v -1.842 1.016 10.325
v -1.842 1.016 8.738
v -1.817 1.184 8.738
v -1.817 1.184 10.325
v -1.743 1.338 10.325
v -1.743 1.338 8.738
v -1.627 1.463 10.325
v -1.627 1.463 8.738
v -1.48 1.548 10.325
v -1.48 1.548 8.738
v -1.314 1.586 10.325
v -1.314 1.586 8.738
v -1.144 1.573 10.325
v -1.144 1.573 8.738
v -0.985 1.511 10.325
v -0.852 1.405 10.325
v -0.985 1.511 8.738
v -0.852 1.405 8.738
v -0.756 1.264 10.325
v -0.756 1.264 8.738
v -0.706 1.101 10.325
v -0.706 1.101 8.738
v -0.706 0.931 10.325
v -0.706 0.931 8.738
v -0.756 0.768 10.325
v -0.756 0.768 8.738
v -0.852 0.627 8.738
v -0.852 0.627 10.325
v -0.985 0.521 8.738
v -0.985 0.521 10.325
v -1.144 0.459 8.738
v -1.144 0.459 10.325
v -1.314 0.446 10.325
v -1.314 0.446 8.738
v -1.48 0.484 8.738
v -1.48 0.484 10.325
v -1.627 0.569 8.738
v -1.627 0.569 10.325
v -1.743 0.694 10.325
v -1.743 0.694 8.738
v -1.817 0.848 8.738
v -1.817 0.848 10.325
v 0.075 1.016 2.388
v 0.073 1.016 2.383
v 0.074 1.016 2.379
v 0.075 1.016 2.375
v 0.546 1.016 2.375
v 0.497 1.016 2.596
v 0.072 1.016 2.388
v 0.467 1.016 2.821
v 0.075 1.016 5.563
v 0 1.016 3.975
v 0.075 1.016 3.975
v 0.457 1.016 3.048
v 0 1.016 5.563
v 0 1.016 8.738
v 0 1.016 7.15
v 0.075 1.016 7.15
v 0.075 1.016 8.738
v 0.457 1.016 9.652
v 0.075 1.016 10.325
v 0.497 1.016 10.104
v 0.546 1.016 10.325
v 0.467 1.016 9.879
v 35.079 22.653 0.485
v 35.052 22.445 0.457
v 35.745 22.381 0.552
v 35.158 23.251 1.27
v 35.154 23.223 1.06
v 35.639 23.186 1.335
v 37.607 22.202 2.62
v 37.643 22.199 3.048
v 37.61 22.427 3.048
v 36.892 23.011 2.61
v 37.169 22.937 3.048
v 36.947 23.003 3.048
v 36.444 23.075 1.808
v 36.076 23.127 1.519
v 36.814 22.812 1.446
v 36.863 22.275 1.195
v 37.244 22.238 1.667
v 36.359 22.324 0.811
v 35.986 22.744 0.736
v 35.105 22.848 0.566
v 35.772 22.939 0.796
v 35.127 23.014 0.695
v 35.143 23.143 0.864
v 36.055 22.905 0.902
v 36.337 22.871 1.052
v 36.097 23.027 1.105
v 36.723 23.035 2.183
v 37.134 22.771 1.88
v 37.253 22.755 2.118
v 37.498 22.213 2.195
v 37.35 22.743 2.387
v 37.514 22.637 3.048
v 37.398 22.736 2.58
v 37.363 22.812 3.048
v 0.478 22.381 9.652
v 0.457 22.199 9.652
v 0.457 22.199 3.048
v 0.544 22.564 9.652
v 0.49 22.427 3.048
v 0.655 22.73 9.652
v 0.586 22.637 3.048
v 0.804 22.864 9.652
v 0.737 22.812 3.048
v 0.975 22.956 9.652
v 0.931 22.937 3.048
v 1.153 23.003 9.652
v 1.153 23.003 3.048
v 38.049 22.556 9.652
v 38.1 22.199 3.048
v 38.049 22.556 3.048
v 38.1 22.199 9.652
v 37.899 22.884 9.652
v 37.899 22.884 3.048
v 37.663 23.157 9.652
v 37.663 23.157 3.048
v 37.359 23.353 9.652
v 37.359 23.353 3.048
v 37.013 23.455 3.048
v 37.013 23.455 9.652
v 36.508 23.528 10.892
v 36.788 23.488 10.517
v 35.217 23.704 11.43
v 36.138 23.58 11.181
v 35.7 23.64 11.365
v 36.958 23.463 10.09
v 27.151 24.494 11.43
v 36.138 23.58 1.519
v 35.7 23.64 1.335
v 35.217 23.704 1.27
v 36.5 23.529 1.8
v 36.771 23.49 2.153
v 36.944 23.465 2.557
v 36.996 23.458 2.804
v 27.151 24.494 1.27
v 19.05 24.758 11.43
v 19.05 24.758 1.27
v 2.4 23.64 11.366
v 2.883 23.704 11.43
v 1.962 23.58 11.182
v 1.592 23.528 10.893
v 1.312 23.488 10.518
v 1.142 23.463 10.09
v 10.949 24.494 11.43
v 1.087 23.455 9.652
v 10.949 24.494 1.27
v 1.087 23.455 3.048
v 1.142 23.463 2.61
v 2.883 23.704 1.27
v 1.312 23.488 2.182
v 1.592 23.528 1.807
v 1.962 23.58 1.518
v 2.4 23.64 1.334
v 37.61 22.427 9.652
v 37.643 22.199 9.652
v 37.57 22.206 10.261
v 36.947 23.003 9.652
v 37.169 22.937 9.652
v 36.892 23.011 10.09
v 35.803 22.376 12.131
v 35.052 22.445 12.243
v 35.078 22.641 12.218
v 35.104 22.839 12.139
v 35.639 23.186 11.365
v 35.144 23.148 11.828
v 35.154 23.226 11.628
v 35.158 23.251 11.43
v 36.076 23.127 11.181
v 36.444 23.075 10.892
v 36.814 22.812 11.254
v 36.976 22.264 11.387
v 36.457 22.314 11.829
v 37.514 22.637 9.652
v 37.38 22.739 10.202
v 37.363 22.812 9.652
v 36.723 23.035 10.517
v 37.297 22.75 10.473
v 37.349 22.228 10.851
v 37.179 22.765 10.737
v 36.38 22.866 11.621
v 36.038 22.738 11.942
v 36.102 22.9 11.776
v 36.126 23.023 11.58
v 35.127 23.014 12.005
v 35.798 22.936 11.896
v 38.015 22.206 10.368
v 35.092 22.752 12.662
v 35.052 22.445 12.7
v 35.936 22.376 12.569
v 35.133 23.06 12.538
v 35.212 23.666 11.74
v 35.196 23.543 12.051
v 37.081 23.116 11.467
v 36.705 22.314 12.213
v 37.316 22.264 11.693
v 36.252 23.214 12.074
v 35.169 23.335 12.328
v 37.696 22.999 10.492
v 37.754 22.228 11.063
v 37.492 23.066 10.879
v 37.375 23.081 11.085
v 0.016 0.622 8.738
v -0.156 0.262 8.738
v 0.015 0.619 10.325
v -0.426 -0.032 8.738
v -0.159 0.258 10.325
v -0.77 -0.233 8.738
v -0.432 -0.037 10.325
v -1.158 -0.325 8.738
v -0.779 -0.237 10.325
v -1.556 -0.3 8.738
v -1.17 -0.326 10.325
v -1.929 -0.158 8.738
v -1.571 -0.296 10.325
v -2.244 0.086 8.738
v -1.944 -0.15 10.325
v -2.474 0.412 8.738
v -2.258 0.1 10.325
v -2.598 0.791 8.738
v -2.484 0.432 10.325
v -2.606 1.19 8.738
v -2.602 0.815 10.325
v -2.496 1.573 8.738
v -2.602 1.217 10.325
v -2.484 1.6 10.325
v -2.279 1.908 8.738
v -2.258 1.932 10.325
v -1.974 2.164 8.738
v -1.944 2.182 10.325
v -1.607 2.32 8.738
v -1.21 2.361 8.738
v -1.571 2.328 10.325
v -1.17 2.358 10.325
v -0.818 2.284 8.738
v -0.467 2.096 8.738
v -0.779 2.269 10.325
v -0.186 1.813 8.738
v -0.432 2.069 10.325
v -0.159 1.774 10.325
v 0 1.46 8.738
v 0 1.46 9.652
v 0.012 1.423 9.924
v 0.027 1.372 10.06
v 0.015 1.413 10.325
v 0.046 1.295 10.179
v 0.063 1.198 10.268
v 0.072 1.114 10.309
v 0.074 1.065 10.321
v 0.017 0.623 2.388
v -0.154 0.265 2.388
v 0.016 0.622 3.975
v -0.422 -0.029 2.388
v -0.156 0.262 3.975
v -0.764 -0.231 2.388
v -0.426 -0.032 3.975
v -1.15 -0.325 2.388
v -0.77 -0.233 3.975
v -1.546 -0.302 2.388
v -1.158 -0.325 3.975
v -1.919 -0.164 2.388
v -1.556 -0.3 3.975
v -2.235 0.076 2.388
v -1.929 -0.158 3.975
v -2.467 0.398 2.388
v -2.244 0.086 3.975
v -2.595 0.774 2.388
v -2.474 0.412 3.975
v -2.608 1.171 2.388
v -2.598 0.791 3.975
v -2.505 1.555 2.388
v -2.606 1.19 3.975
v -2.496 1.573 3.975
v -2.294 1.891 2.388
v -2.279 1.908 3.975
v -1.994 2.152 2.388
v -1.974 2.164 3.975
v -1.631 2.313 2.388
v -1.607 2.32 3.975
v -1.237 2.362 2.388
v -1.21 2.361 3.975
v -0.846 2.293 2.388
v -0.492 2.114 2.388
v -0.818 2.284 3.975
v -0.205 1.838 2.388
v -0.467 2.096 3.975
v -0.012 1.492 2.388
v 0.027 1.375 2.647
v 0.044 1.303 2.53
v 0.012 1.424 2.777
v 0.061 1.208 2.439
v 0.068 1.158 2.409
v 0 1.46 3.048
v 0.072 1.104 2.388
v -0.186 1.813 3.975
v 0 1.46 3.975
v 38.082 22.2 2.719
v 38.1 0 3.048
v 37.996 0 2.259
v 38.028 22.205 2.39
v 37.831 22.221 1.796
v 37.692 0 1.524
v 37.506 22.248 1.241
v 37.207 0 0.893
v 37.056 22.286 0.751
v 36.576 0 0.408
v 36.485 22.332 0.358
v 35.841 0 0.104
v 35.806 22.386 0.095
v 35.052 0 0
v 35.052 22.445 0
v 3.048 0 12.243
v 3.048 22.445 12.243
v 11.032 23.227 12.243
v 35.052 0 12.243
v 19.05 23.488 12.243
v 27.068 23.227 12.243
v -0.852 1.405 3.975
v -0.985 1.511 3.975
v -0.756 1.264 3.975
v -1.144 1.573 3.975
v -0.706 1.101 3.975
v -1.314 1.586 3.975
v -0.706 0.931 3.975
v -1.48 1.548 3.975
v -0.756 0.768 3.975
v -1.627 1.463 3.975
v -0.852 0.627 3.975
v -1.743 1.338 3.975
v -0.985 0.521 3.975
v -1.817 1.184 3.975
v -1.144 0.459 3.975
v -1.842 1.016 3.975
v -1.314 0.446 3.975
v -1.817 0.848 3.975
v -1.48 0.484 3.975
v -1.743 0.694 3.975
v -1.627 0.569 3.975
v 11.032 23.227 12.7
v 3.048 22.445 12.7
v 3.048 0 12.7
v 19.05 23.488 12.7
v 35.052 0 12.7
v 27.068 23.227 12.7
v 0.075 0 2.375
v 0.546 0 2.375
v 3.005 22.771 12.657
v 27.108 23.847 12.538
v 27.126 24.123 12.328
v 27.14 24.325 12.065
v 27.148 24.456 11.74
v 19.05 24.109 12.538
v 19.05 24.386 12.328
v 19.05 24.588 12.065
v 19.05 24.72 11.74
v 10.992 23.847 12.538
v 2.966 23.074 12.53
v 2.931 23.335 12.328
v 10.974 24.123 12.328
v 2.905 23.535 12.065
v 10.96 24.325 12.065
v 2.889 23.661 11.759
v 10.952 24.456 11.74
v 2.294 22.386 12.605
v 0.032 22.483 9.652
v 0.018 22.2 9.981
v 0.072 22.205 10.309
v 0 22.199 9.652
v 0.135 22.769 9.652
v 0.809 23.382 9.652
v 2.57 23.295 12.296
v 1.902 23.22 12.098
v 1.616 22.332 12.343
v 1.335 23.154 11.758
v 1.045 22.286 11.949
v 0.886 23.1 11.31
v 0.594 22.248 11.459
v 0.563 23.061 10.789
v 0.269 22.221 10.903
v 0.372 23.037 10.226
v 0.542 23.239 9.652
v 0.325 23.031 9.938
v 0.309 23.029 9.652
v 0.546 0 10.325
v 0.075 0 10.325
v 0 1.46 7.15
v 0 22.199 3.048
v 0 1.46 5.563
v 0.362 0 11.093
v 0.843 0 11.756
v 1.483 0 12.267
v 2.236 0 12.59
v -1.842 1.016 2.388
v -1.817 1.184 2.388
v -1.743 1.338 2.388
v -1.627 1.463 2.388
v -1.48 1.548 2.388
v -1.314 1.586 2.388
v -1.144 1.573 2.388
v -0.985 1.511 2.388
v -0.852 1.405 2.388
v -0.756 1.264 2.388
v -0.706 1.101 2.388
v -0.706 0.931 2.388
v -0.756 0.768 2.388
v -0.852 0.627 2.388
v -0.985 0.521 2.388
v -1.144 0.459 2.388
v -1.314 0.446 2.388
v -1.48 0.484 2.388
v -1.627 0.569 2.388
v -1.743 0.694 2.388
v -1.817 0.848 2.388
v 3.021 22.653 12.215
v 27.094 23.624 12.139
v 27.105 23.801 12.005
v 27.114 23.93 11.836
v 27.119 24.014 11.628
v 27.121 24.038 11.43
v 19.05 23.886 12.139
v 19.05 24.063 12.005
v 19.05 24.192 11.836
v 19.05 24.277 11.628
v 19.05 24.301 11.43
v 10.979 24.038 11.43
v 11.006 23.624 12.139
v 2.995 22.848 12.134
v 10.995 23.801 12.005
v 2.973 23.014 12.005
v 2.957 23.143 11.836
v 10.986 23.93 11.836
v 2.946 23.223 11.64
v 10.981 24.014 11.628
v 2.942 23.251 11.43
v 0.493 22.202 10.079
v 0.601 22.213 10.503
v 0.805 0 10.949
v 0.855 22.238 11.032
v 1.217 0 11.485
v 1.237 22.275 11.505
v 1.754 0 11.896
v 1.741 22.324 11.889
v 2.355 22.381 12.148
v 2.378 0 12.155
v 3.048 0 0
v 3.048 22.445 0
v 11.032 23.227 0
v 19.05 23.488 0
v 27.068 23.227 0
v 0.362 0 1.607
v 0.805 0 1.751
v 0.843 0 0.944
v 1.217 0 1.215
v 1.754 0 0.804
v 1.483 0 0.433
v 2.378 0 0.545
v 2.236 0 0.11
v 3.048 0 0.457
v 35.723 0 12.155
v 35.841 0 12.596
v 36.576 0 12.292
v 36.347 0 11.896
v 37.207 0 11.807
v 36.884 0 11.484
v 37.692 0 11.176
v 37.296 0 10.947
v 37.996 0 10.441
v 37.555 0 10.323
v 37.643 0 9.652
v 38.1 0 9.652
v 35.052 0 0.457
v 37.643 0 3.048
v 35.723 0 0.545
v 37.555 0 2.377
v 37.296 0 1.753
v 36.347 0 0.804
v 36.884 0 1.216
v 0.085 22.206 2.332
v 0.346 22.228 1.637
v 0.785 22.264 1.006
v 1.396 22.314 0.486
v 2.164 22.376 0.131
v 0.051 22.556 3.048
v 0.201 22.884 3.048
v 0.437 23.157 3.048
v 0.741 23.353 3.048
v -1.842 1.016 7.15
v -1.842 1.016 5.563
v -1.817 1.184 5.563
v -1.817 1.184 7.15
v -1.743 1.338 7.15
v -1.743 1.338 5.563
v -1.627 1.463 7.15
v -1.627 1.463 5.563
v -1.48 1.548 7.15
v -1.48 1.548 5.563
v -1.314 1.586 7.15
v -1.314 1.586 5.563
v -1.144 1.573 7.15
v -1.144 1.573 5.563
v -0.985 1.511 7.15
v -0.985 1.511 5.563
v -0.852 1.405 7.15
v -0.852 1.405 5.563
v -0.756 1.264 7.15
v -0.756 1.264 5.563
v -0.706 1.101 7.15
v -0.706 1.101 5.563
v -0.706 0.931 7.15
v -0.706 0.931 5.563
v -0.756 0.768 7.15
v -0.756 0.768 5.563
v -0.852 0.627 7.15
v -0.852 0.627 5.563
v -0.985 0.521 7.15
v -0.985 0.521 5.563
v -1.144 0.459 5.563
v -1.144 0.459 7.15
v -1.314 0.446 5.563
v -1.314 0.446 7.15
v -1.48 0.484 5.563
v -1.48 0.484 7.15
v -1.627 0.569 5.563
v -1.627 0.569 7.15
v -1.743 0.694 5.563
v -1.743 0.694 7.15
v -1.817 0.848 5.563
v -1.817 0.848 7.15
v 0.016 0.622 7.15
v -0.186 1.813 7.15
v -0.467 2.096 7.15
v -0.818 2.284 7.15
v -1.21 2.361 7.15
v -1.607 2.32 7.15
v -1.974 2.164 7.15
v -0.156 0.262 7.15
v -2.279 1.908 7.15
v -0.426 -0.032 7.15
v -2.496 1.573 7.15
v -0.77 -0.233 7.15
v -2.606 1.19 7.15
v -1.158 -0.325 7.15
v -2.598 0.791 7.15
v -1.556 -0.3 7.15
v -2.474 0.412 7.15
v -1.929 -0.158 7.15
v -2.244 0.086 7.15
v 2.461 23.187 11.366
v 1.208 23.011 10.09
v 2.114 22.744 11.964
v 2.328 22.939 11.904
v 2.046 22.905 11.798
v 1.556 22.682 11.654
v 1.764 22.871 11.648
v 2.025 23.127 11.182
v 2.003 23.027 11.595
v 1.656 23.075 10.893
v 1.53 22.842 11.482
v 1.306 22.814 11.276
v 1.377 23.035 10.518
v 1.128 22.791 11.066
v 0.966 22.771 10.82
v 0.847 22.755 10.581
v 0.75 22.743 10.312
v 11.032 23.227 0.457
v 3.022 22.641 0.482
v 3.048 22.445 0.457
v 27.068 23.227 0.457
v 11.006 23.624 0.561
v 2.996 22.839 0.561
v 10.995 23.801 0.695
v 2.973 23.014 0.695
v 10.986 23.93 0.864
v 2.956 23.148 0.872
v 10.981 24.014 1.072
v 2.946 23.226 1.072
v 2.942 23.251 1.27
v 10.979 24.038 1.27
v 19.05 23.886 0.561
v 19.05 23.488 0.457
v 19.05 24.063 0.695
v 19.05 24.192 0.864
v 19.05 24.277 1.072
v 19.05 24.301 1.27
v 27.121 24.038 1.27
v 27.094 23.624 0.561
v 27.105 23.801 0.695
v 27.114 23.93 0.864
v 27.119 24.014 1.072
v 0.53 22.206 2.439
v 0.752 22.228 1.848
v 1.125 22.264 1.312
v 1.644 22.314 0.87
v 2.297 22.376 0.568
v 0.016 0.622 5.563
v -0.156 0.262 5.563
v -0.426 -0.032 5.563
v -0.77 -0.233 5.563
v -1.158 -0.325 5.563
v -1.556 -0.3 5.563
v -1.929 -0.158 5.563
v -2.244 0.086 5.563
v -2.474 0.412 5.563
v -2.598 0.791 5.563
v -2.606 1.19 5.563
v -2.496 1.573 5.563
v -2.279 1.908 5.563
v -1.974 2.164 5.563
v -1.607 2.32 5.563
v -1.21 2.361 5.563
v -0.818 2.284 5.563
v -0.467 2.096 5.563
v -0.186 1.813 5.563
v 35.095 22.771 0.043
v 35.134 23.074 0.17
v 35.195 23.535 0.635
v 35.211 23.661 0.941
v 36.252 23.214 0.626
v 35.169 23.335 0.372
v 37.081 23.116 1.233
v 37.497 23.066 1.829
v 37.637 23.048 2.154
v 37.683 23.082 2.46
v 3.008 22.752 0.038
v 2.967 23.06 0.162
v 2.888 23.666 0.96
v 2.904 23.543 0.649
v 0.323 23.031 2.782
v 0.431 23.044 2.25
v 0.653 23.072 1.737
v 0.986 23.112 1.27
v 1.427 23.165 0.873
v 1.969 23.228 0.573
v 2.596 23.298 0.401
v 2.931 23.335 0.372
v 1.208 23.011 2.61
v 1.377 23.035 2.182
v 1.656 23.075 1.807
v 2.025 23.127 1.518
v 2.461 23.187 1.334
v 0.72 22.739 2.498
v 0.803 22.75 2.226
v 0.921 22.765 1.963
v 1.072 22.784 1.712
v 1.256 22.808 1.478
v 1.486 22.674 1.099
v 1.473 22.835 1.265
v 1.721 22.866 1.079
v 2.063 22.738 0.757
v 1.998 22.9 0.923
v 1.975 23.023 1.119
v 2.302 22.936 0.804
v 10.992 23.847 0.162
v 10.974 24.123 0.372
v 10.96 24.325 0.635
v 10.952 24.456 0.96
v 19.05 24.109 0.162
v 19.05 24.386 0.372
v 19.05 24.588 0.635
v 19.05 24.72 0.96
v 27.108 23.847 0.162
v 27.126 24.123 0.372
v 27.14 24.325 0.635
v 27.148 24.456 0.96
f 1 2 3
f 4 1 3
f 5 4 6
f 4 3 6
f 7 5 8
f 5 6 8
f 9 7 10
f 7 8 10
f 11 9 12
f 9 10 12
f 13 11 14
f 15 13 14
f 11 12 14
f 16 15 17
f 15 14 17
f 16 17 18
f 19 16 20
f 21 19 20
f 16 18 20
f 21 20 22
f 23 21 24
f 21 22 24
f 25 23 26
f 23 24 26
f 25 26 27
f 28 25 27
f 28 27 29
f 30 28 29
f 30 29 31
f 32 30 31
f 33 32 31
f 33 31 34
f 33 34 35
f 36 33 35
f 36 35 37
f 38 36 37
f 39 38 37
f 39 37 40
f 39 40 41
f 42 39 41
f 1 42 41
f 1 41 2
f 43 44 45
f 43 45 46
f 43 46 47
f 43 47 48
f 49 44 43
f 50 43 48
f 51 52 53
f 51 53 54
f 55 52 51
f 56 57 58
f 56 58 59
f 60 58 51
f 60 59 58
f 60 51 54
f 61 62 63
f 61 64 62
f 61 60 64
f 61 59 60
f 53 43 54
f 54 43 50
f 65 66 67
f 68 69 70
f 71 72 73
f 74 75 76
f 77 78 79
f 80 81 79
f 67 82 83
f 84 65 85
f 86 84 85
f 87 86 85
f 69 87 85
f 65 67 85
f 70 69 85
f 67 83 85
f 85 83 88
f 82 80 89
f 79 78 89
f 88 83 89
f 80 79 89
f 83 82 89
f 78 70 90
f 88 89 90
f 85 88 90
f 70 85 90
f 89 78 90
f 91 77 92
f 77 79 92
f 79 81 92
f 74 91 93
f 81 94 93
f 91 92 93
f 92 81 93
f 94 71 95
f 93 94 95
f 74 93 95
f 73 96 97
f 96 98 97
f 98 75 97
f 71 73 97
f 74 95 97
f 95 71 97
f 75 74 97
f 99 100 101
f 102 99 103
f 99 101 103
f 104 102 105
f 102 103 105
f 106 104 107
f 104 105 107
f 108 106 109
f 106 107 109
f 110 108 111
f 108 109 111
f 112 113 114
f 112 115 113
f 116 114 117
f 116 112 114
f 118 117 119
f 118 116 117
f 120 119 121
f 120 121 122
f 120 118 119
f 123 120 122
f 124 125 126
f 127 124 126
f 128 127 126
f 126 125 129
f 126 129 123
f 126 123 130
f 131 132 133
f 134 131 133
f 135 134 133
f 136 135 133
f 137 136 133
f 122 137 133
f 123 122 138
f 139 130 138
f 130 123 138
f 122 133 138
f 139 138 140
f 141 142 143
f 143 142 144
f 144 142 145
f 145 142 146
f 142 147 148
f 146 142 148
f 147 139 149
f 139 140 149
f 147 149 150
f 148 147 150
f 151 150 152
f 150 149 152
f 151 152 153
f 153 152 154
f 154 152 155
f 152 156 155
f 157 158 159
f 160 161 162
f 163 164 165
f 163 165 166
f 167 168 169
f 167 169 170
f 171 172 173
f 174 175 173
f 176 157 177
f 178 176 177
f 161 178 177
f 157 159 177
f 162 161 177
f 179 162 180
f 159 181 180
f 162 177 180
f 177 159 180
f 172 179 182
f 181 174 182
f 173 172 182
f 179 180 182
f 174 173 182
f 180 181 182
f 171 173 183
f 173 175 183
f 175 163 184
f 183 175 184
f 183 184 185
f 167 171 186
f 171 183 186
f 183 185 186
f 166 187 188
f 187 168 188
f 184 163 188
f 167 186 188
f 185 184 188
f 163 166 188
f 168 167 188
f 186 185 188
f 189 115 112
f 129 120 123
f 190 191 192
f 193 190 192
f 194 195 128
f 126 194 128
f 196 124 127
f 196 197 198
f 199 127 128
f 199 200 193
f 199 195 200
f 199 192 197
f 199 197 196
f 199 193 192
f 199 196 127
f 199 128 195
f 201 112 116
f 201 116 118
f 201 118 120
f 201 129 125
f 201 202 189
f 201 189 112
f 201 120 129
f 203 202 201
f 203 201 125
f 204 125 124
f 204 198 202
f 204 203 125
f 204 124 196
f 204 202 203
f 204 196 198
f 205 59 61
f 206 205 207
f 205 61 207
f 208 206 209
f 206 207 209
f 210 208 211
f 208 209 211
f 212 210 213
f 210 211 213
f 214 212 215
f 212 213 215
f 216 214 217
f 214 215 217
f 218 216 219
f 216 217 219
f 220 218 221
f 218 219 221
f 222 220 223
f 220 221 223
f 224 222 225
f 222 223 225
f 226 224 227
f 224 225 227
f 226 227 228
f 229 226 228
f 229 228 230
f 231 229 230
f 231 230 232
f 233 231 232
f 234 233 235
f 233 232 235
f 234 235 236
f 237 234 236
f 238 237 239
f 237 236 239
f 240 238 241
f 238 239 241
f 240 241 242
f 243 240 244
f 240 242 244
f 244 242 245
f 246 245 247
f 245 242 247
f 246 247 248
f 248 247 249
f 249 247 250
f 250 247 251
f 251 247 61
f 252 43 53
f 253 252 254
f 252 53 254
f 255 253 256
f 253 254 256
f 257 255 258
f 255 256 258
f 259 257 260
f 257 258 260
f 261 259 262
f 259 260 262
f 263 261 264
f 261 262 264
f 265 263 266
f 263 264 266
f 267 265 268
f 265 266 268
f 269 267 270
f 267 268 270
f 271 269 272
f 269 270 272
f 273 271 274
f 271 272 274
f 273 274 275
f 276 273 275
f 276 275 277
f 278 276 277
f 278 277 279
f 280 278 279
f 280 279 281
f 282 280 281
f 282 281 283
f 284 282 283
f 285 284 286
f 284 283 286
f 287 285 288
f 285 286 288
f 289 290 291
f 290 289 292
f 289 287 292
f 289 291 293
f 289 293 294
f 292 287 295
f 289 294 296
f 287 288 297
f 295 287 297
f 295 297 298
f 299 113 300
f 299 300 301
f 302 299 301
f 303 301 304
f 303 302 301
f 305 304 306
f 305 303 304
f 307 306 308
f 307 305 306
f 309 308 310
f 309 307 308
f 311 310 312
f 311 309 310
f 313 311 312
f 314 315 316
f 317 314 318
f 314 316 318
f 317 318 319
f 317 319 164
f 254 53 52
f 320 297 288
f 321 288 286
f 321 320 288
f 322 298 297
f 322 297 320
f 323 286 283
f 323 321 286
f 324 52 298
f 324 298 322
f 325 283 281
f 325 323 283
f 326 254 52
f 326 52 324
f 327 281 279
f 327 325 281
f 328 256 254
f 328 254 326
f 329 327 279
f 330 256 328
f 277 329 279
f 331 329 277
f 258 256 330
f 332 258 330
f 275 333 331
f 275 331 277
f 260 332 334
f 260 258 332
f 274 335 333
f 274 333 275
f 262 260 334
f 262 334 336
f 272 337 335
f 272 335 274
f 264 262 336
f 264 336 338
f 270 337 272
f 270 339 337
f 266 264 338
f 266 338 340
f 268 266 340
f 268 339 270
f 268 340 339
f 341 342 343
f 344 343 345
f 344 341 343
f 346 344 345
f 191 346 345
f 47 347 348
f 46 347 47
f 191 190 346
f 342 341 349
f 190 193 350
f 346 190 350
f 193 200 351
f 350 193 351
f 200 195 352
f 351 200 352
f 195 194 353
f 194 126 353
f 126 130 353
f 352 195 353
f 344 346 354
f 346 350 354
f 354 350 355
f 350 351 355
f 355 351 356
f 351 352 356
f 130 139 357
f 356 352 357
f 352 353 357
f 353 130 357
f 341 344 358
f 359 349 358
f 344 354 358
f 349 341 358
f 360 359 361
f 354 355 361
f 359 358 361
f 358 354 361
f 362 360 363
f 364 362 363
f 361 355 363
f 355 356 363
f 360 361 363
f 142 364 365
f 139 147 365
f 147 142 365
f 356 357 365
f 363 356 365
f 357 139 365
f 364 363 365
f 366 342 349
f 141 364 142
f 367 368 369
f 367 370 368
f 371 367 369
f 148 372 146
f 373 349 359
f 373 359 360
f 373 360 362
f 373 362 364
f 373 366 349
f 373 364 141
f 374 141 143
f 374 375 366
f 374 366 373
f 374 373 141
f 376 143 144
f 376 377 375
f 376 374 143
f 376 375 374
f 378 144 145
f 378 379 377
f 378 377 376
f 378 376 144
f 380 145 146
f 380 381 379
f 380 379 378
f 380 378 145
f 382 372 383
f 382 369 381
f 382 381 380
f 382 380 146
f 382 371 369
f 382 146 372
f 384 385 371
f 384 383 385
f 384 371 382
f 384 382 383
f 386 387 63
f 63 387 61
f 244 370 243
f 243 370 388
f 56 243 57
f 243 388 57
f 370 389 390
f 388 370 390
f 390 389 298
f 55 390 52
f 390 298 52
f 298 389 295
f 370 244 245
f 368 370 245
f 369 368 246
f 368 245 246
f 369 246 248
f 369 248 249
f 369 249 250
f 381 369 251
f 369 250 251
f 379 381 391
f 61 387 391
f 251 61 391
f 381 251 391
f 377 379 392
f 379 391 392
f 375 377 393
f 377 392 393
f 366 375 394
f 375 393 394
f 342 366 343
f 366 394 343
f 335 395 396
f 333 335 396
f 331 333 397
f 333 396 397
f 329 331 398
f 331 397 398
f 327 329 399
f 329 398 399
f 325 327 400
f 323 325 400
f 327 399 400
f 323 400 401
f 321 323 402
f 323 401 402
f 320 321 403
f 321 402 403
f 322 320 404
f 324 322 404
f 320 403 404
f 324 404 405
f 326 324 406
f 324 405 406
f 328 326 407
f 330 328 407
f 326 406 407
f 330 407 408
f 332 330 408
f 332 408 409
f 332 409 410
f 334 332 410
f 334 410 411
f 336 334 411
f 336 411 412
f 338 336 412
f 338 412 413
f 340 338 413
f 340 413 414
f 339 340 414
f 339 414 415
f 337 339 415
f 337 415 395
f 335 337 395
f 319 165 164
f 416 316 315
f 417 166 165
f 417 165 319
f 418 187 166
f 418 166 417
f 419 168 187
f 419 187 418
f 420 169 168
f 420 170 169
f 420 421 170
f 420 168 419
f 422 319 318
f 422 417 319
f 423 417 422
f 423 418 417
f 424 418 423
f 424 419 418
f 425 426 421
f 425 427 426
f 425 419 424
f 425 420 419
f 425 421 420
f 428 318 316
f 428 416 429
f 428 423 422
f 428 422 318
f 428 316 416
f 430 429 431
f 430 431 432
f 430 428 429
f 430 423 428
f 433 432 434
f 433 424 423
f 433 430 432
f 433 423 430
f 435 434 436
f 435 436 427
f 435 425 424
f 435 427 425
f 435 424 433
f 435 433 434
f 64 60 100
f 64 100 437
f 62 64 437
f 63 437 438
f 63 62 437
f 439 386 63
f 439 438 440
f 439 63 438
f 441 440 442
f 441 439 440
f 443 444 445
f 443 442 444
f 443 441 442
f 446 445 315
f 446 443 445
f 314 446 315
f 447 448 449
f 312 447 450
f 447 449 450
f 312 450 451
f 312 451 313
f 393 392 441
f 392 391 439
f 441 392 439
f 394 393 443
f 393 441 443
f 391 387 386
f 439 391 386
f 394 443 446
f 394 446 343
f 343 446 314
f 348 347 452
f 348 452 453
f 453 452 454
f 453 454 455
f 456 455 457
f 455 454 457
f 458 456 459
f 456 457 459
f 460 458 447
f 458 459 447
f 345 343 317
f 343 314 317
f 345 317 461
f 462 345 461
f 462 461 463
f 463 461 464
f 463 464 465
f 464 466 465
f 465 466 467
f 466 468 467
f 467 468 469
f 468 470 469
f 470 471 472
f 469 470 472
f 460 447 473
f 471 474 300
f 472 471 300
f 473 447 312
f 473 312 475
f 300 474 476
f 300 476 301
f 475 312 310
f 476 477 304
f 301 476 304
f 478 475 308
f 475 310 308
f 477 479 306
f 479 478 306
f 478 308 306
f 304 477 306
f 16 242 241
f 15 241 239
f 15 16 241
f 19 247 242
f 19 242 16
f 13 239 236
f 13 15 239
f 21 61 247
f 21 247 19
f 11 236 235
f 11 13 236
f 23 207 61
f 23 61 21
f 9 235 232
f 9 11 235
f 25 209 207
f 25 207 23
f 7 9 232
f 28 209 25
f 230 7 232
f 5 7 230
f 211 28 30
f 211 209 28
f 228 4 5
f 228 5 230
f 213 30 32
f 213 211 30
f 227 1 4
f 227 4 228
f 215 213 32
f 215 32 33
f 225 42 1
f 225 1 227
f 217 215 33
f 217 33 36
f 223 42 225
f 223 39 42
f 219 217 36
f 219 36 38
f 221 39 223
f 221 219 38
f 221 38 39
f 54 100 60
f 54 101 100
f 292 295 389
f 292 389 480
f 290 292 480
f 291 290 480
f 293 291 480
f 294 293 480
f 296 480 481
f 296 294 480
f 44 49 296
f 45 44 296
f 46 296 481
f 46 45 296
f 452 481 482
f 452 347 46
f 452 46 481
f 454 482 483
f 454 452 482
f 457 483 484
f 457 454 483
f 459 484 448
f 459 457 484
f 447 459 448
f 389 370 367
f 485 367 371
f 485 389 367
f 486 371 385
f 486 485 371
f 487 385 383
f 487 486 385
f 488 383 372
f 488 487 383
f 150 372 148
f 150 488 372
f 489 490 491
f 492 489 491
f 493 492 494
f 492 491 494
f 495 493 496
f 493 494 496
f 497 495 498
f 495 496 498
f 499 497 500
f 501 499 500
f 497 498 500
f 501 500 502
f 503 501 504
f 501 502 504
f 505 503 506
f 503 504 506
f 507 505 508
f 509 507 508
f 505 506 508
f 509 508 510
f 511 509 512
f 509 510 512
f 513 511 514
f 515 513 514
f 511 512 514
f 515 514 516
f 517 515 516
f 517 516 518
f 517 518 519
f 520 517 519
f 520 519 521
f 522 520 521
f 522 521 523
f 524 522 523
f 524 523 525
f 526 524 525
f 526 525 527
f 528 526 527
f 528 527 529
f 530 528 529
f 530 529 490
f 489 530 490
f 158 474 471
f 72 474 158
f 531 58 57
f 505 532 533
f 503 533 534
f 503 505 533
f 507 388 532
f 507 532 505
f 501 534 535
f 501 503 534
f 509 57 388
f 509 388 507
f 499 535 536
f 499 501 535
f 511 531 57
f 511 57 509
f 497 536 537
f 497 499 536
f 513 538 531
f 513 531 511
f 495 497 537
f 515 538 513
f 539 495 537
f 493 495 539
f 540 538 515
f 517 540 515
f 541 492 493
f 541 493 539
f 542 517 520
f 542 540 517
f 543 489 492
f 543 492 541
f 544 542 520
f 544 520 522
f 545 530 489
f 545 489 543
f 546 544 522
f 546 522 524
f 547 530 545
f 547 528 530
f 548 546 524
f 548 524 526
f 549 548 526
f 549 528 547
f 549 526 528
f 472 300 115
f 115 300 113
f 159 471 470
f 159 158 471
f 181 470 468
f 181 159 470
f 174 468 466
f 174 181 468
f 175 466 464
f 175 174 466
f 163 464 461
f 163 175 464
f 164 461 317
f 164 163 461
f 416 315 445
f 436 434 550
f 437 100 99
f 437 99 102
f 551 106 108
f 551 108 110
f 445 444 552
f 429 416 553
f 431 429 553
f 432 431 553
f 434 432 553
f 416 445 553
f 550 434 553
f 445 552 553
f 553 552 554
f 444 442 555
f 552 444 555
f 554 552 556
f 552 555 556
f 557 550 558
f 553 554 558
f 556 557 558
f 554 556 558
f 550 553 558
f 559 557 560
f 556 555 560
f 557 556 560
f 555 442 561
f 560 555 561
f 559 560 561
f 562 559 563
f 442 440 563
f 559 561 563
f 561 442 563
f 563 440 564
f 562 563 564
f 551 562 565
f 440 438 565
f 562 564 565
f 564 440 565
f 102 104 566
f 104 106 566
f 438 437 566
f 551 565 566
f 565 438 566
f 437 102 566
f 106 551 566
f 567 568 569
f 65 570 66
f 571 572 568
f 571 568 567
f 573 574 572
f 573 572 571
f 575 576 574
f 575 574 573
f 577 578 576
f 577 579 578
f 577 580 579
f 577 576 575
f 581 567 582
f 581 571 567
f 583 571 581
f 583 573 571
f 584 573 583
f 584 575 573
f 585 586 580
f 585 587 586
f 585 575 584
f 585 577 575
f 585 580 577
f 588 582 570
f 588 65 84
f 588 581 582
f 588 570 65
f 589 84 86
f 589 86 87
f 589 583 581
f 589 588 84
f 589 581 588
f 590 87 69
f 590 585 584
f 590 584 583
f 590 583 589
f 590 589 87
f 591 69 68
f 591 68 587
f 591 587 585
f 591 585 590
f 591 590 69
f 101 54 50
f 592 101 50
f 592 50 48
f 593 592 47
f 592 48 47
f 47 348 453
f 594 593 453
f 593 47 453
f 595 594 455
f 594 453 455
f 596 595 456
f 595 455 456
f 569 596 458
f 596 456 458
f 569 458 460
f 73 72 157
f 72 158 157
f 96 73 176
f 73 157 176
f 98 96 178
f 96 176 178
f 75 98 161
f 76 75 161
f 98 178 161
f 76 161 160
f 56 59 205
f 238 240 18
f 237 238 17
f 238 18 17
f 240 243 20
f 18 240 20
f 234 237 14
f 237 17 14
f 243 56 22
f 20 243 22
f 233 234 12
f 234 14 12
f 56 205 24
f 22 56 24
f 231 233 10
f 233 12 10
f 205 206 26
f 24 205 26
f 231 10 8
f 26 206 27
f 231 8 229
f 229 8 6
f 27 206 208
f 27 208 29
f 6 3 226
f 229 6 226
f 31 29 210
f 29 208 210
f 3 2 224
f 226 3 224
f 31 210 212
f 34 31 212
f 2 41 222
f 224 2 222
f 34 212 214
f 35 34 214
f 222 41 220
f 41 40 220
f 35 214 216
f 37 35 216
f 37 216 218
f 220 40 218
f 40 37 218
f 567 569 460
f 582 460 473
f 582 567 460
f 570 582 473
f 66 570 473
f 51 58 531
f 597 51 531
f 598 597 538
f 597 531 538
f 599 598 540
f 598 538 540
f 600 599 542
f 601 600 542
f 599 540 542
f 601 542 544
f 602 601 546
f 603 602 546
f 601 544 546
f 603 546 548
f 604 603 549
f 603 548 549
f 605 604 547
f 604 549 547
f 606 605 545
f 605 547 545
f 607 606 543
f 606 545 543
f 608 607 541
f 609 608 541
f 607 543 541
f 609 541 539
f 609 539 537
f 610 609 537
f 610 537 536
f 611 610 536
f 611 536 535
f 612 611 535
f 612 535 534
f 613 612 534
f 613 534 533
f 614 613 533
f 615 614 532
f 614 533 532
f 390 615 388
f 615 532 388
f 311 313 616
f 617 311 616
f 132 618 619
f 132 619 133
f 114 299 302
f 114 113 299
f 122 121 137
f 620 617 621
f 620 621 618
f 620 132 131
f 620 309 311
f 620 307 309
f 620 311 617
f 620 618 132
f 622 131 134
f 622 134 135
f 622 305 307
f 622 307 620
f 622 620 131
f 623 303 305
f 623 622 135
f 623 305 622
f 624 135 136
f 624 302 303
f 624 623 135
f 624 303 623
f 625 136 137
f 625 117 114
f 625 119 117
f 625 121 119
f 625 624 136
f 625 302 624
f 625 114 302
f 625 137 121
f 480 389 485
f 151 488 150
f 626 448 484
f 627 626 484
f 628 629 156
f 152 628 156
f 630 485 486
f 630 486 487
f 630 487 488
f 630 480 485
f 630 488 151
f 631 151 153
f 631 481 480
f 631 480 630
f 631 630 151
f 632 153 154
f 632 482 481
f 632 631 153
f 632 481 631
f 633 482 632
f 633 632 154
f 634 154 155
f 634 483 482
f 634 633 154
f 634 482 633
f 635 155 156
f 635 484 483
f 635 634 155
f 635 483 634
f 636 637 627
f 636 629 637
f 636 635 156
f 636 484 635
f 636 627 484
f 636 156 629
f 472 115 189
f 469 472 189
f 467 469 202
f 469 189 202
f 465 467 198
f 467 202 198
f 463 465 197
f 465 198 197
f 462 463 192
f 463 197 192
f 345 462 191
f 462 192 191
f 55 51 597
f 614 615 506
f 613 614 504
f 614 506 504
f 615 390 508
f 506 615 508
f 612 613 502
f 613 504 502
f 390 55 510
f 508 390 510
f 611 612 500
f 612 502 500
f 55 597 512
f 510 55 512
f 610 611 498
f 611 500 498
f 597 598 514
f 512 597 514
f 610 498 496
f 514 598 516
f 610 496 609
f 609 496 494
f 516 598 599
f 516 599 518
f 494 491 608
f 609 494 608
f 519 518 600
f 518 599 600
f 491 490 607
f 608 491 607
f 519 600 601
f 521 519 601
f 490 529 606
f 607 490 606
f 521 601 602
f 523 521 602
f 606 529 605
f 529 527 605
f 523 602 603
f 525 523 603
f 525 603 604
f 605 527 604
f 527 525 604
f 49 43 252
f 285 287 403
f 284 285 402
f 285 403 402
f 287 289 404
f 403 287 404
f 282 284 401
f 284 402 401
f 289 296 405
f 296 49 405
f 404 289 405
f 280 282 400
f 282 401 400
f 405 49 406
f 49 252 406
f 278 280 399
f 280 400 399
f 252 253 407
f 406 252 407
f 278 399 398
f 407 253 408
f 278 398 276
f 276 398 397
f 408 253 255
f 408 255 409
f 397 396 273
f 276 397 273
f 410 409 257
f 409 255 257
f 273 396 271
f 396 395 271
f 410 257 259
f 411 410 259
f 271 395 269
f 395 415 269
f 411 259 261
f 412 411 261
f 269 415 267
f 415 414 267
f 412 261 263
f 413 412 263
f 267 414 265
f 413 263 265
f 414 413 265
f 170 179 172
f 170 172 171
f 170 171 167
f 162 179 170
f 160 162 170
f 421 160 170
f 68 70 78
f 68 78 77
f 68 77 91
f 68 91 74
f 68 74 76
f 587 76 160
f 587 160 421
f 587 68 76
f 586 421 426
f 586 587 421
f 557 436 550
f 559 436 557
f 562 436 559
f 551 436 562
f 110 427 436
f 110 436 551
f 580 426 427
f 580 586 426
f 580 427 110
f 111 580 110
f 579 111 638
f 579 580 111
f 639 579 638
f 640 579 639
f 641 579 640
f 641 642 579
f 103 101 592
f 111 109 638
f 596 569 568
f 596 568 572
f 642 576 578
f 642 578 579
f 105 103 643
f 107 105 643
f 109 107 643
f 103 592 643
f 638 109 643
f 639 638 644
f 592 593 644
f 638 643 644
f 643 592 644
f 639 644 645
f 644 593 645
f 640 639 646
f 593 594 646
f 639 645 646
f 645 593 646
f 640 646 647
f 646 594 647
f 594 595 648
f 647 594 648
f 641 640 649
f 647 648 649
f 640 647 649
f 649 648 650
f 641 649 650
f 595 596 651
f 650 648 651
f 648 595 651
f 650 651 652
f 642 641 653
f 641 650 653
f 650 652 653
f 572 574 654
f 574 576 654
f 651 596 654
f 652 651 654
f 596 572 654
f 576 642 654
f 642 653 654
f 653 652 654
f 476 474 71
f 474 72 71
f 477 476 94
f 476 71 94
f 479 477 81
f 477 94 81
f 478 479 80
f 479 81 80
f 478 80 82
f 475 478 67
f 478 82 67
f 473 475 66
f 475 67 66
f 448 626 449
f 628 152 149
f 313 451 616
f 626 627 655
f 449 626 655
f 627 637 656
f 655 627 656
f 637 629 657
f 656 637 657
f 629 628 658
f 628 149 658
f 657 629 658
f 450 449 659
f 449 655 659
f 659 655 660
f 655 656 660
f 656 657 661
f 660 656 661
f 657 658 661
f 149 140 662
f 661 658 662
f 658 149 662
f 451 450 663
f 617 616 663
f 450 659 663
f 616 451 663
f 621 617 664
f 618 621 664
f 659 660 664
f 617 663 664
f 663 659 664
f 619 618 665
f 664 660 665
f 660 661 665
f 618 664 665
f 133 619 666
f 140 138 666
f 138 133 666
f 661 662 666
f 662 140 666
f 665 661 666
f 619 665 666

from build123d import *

# Parameters (mm, degrees)
BOSS_EXTRUDE1_DEPTH = 12.7
FILLET7_R           = 3.048
FILLET8_R           = 1.27
SHELL2_T            = -0.4572
SKETCH2_W           = 7.9502
SKETCH2_H           = 1.016
CUT_EXTRUDE1_DEPTH  = 11.7856
SKETCH4_W           = 1.3462
SKETCH4_H           = 1.5875
SKETCH5_R           = 0.5715
CUT_EXTRUDE2_DEPTH  = 11.3124001


with BuildPart() as part:
    # Sketch1 → Boss-Extrude1 (new body)
    with BuildSketch(Plane.XY):
        with BuildLine():
            Line((0, 0), (38.1, 0))
            Line((38.1, 0), (38.1, 23.2918))
            ThreePointArc((38.1, 23.2918), (19.05, 24.758348548), (0, 23.2918))
            Line((0, 23.2918), (0, 0))
        make_face()
    extrude(amount=BOSS_EXTRUDE1_DEPTH)

    # Fillet7
    fillet7_edges = [part.edges().sort_by_distance(p)[0] for p in [
        (38.1, 11.6459, 12.7),
        (0, 11.6459, 12.7),
        (38.1, 11.6459, 0),
        (0, 11.6459, 0),
    ]]
    fillet(fillet7_edges, radius=FILLET7_R)

    # Fillet8
    fillet8_edges = [part.edges().sort_by_distance(p)[0] for p in [
        (38.1, 23.2918, 6.35),
        (19.05, 24.758348548, 0),
        (0, 23.2918, 6.35),
        (19.05, 24.758348548, 12.7),
        (0.897565394, 23.427470684, 11.812077539),
        (0.897565394, 23.427470684, 0.887922461),
        (37.20243455, 23.427470691, 11.812077599),
        (37.20243455, 23.427470691, 0.887922401),
    ]]
    fillet(fillet8_edges, radius=FILLET8_R)

    # Shell2
    shell2_openings = [part.faces().sort_by_distance(p)[0] for p in [
        (19.05, 0, 6.35),
    ]]
    offset(amount=SHELL2_T, openings=shell2_openings, kind=Kind.INTERSECTION)

    # Sketch2 → Cut-Extrude1 (cut)
    with BuildSketch(Plane.ZY):
        with Locations((6.35, 0.508)):
            Rectangle(SKETCH2_W, SKETCH2_H)
    extrude(amount=-CUT_EXTRUDE1_DEPTH, mode=Mode.SUBTRACT)

    # Sketch4 → Revolve1 (revolve)
    with BuildSketch(Plane.XZ.offset(-1.016)):
        with Locations((-0.597849635, 6.35635)):
            Rectangle(SKETCH4_W, SKETCH4_H)
        with Locations((-0.597849635, 9.53135)):
            Rectangle(SKETCH4_W, SKETCH4_H)
        with Locations((-0.597849635, 3.18135)):
            Rectangle(SKETCH4_W, SKETCH4_H)
    revolve(axis=Axis((-1.270949635, 1.016, 10.3251), (0, 0, -1)))

    # Sketch5 → Cut-Extrude2 (cut, through all)
    with BuildSketch(Plane(origin=(0, 0, 2.3876), x_dir=(-1, 0, 0), z_dir=(0, 0, -1))):
        with Locations((1.270949635, 1.016)):
            Circle(SKETCH5_R)
    extrude(amount=-CUT_EXTRUDE2_DEPTH, mode=Mode.SUBTRACT)


solid = part.part
